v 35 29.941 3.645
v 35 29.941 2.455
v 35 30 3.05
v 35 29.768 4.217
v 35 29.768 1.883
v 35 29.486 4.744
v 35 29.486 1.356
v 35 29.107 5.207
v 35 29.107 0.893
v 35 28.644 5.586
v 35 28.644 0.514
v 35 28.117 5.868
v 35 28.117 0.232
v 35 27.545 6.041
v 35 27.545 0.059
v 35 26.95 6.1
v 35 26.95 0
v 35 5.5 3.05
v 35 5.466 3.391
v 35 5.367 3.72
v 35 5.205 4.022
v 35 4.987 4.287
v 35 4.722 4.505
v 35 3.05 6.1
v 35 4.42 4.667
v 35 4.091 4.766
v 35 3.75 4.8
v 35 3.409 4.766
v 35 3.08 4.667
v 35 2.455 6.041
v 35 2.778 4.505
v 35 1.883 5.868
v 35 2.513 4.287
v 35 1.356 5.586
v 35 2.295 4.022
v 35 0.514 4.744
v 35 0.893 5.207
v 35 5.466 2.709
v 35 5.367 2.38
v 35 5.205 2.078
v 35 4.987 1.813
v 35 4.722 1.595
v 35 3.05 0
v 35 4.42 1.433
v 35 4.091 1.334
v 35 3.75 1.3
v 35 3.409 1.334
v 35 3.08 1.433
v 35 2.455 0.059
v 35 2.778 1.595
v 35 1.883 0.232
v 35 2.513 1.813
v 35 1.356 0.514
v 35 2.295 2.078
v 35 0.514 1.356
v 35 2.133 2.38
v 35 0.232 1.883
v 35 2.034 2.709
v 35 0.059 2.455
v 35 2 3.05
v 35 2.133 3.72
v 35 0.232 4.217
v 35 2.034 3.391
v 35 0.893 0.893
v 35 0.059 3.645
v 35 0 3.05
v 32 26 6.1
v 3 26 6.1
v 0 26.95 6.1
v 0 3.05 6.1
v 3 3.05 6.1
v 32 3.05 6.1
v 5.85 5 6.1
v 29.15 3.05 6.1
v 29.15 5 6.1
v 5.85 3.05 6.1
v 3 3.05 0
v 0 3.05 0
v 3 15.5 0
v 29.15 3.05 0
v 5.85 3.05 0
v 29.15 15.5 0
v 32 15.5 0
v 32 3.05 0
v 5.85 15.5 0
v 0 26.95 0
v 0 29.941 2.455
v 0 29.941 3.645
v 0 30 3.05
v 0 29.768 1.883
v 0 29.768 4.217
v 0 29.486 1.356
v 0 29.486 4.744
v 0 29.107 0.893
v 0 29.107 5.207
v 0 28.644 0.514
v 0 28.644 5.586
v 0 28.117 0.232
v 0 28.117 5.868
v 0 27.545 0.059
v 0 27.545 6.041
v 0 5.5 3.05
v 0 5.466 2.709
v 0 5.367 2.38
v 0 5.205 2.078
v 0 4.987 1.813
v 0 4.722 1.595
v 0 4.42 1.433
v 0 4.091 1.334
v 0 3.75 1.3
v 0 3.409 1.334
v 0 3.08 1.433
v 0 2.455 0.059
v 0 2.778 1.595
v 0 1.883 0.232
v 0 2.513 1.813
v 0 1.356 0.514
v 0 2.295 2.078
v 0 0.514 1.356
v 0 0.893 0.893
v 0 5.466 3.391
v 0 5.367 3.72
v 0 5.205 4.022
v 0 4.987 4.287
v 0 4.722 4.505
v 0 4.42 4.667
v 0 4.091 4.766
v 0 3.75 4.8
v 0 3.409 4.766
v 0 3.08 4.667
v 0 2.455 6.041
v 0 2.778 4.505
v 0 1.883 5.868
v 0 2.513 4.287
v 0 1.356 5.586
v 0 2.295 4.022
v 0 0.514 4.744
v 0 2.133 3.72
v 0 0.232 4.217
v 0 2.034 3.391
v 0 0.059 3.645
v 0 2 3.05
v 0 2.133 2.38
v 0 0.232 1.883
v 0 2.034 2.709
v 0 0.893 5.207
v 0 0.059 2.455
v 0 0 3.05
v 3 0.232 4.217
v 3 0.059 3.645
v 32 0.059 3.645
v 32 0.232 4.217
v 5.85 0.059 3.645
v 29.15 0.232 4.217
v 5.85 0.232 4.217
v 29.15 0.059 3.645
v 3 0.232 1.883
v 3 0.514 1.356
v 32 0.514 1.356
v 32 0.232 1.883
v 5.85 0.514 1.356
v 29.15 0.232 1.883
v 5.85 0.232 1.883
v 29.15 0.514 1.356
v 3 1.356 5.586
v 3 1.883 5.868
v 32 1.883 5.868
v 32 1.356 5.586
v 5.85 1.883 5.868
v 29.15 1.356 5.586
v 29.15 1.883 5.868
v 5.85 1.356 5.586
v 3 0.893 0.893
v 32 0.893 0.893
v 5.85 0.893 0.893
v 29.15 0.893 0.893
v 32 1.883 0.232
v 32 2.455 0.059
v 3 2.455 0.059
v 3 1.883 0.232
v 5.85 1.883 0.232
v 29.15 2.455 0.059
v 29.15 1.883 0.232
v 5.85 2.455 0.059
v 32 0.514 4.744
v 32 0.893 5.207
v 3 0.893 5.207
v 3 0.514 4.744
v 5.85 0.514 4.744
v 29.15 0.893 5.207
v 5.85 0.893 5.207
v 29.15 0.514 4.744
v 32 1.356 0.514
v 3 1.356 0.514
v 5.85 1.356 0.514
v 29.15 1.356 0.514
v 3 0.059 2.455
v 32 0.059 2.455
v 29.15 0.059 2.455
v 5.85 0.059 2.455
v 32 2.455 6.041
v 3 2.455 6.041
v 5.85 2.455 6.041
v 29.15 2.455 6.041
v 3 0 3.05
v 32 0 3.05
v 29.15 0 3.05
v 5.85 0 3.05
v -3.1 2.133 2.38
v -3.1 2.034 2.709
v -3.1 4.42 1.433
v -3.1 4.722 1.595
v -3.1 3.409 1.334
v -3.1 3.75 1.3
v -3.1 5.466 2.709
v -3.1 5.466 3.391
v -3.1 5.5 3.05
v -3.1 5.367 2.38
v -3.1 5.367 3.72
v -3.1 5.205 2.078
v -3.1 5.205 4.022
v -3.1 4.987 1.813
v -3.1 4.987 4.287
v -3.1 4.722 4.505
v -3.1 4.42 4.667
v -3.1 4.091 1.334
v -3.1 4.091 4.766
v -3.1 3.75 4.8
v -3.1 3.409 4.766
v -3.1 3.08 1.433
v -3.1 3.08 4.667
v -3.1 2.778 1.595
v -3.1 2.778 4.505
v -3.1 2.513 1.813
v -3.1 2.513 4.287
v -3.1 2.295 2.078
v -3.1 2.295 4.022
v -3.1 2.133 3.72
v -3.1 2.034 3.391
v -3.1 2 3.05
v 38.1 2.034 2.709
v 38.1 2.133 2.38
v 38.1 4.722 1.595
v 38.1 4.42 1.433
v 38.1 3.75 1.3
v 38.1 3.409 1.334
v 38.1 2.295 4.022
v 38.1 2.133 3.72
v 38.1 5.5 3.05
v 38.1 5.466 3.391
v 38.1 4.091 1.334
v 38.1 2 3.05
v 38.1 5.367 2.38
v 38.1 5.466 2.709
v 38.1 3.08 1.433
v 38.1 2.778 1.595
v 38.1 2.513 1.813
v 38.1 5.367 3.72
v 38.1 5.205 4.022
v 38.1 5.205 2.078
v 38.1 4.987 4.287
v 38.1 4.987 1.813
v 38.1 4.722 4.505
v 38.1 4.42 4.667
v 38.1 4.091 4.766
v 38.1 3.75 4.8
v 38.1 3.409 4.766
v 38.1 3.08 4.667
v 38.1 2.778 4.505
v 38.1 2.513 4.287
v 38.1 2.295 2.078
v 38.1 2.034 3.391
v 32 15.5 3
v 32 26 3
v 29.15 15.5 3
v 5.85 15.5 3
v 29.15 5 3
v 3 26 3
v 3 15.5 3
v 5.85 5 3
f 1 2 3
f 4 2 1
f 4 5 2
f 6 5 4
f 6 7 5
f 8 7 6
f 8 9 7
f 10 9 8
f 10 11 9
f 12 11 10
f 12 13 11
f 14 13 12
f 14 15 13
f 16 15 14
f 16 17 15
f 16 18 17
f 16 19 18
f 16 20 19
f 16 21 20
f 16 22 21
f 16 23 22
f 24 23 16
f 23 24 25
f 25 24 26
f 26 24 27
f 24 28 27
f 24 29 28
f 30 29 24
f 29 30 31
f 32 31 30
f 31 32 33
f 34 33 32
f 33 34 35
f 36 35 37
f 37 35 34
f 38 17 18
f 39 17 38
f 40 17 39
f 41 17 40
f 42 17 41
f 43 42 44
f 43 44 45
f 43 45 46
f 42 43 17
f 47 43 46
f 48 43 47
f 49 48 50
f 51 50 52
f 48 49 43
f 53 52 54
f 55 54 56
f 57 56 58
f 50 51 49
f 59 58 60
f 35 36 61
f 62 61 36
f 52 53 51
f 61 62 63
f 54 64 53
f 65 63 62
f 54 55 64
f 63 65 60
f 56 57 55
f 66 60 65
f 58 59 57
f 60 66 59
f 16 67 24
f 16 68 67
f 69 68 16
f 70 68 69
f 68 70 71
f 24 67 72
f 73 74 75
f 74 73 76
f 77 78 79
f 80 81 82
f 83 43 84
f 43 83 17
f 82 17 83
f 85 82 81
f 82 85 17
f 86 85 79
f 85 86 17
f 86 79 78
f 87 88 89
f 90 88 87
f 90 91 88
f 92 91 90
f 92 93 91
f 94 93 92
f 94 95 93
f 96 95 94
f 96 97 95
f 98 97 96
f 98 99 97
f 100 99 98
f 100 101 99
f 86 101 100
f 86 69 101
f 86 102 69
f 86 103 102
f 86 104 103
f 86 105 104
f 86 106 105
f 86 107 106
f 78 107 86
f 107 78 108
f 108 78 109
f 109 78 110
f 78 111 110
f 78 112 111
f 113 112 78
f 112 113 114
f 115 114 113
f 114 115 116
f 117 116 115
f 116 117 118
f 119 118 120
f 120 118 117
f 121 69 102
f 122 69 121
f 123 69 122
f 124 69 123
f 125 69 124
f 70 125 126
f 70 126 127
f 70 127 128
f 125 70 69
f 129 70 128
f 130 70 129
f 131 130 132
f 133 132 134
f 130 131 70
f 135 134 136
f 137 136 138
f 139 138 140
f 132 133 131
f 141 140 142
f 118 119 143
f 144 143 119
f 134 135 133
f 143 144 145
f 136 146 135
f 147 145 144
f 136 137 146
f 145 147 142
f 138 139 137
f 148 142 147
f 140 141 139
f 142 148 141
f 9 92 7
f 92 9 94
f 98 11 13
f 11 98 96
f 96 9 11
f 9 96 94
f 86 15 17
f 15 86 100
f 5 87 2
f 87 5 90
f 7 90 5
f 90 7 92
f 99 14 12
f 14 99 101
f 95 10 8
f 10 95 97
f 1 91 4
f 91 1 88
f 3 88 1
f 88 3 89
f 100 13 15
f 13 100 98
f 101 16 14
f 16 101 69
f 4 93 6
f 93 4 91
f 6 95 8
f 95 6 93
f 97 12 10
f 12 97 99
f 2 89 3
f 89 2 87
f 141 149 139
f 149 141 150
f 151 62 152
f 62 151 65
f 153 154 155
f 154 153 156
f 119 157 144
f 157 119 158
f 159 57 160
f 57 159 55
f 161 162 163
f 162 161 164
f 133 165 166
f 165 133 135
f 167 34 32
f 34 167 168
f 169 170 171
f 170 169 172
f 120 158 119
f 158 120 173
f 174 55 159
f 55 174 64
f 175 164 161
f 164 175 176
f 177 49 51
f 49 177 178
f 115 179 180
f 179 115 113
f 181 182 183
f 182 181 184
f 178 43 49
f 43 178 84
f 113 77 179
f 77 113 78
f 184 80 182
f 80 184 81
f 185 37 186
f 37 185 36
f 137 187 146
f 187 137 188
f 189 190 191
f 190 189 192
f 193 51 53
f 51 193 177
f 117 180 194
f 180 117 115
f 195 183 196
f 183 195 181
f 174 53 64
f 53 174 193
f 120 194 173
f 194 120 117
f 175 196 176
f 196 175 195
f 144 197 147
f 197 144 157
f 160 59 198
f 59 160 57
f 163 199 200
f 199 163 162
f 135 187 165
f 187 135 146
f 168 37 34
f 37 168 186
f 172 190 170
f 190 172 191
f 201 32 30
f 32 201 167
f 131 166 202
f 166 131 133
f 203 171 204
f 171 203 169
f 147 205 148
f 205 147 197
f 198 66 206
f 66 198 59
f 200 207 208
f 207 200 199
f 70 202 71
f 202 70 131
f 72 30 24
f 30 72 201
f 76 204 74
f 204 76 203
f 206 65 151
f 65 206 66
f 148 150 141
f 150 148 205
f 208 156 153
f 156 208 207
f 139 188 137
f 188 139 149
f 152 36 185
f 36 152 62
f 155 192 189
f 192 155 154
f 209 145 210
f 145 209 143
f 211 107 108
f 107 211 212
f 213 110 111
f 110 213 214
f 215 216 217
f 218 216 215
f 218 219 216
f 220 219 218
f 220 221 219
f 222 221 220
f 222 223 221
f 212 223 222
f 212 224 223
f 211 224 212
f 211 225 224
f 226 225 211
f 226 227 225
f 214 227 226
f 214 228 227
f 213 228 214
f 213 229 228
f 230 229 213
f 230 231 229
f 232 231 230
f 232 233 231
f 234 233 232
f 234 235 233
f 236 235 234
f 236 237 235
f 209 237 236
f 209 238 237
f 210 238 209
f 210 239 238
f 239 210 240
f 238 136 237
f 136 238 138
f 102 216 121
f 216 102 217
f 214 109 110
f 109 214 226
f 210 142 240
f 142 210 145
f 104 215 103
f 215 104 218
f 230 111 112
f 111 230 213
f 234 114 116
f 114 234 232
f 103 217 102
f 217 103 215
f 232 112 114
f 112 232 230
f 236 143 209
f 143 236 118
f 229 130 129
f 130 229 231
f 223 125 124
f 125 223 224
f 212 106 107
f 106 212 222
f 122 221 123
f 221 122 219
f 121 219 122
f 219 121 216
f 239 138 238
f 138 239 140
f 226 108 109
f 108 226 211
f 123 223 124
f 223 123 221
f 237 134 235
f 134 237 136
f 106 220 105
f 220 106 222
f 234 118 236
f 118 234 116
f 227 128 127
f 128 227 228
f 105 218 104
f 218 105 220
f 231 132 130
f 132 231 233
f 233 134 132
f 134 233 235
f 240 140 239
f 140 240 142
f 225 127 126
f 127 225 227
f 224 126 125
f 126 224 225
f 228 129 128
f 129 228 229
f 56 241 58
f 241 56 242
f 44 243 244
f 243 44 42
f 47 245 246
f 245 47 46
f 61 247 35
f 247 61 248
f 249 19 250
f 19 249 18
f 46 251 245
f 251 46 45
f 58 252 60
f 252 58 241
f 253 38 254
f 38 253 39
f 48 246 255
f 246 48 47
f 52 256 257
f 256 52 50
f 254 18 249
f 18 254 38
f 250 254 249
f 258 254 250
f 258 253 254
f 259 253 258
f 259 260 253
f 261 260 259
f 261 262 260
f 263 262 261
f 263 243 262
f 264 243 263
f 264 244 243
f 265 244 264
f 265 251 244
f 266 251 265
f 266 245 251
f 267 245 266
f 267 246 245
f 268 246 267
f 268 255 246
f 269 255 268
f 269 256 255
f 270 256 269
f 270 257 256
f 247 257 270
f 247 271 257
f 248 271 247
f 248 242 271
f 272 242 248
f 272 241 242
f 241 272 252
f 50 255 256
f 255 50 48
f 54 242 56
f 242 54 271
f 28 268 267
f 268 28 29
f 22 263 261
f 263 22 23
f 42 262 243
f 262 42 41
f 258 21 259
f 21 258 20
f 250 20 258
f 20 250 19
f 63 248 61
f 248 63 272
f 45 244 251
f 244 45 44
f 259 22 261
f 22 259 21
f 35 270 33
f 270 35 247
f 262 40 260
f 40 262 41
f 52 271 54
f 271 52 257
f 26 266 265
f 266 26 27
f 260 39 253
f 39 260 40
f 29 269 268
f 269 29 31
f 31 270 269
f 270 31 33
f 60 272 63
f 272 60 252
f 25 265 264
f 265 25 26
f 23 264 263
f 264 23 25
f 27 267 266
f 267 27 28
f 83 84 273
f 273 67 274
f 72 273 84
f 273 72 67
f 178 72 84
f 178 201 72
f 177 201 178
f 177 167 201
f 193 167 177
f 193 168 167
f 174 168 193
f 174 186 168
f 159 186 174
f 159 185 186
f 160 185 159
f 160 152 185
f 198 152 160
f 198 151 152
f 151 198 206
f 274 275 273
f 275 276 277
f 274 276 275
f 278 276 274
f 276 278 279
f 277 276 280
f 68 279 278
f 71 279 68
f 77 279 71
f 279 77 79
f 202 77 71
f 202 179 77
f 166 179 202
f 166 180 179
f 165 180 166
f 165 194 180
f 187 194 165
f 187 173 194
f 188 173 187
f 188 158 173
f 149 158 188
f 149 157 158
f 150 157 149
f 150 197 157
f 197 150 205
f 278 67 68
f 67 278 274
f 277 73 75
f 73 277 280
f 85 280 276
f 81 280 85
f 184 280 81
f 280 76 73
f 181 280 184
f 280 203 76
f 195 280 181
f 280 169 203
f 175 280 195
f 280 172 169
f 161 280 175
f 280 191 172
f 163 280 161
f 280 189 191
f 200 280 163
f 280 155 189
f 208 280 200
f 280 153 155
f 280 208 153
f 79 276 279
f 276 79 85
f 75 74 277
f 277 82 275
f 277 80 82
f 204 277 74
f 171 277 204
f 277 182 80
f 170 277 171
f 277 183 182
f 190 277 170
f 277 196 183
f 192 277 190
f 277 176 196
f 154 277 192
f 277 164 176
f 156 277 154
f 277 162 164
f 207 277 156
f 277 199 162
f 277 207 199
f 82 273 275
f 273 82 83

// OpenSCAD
// The knobs will require supports, and the round ends may need supports depending on the printer and material

//CUSTOMIZER VARIABLES

/* [Basic_Parameters] */

// Body width (not including nobs), in mm
body_width = 35.0;  // [10:0.1:80]

// Full length, in mm
full_length = 30.0;  // [10:0.1:80]

// Full height/thickness, in mm
full_height = 6.1;  // [2:0.1:20]

// Interior height/thickness, in mm
interior_height = 3.0;  // [2:0.1:20]

// Top lip length, in mm
top_lip_length = 5.0;  // [0:0.1:20]

// Bottom lip length, in mm
bottom_lip_length = 4.0;  // [0:0.1:20]

// Arm width, in mm
arm_width = 3.0;  // [1:0.1:20]

// Arm gap width, in mm
arm_gap_width = 2.85;  // [0:0.1:20]

// Arm gap length, in mm
arm_gap_length = 15.5;  // [0:0.1:20]

// Knob diameter, in mm
knob_diameter = 3.5;  // [0:0.05:20]

// Knob length, in mm
knob_length = 3.1;  // [0:0.05:20]

// Knob inset from end, in mm
knob_inset = 3.75;  // [0:0.05:20]

//CUSTOMIZER VARIABLES END



// Sanity checks

if ( (2*arm_gap_width + 2*arm_width) >= body_width)
{
    echo("<B>Error: Arms too wide for body</B>");
}

if ((top_lip_length + bottom_lip_length) > full_length)
{
    echo("<B>Error: Body too short</B>");
}


// our object, flat on xy plane for easy STL generation
keyboard_leg();

module keyboard_leg() { 
    
    knob_radius = knob_diameter / 2;
    round_diameter = full_height;
    round_radius = round_diameter / 2;
    interior_length = full_length - top_lip_length - bottom_lip_length;

    difference() {

        union() {
          
          // the main block
          translate([0,round_radius,0])
            cube([body_width,full_length-2*round_radius,full_height]);
          
          // round end on bottom of leg
          translate([0,full_length-round_radius,round_radius])
            rotate([0,90,0])
              cylinder(body_width, round_radius, round_radius, $fn=32 );
          
          // round end on top of leg
          translate([0,round_radius,round_radius])
            rotate([0,90,0])
              cylinder(body_width, round_radius, round_radius, $fn=32 );
          
          // knobs on arms
          translate([-knob_length,knob_inset,full_height/2])
            rotate([0,90,0])
              cylinder(knob_length, knob_radius, knob_radius, $fn=32 );
          translate([body_width,knob_inset,full_height/2])
            rotate([0,90,0])
              cylinder(knob_length, knob_radius, knob_radius, $fn=32 );
        
        }

        // main block hollow interior
        hollow_height = full_height - interior_height;
        hollow_y = full_length - interior_length;
        hollow_width = body_width - 2*arm_width;
        translate([arm_width,top_lip_length,interior_height])
          cube([hollow_width,interior_length,hollow_height+2]);
        
        // arm gaps
        translate([arm_width,-2,-1])
          cube([arm_gap_width,arm_gap_length+2,full_height+2]);
        translate([body_width - arm_width - arm_gap_width,-2,-1])
          cube([arm_gap_width,arm_gap_length+2,full_height+2]);

    }
}
